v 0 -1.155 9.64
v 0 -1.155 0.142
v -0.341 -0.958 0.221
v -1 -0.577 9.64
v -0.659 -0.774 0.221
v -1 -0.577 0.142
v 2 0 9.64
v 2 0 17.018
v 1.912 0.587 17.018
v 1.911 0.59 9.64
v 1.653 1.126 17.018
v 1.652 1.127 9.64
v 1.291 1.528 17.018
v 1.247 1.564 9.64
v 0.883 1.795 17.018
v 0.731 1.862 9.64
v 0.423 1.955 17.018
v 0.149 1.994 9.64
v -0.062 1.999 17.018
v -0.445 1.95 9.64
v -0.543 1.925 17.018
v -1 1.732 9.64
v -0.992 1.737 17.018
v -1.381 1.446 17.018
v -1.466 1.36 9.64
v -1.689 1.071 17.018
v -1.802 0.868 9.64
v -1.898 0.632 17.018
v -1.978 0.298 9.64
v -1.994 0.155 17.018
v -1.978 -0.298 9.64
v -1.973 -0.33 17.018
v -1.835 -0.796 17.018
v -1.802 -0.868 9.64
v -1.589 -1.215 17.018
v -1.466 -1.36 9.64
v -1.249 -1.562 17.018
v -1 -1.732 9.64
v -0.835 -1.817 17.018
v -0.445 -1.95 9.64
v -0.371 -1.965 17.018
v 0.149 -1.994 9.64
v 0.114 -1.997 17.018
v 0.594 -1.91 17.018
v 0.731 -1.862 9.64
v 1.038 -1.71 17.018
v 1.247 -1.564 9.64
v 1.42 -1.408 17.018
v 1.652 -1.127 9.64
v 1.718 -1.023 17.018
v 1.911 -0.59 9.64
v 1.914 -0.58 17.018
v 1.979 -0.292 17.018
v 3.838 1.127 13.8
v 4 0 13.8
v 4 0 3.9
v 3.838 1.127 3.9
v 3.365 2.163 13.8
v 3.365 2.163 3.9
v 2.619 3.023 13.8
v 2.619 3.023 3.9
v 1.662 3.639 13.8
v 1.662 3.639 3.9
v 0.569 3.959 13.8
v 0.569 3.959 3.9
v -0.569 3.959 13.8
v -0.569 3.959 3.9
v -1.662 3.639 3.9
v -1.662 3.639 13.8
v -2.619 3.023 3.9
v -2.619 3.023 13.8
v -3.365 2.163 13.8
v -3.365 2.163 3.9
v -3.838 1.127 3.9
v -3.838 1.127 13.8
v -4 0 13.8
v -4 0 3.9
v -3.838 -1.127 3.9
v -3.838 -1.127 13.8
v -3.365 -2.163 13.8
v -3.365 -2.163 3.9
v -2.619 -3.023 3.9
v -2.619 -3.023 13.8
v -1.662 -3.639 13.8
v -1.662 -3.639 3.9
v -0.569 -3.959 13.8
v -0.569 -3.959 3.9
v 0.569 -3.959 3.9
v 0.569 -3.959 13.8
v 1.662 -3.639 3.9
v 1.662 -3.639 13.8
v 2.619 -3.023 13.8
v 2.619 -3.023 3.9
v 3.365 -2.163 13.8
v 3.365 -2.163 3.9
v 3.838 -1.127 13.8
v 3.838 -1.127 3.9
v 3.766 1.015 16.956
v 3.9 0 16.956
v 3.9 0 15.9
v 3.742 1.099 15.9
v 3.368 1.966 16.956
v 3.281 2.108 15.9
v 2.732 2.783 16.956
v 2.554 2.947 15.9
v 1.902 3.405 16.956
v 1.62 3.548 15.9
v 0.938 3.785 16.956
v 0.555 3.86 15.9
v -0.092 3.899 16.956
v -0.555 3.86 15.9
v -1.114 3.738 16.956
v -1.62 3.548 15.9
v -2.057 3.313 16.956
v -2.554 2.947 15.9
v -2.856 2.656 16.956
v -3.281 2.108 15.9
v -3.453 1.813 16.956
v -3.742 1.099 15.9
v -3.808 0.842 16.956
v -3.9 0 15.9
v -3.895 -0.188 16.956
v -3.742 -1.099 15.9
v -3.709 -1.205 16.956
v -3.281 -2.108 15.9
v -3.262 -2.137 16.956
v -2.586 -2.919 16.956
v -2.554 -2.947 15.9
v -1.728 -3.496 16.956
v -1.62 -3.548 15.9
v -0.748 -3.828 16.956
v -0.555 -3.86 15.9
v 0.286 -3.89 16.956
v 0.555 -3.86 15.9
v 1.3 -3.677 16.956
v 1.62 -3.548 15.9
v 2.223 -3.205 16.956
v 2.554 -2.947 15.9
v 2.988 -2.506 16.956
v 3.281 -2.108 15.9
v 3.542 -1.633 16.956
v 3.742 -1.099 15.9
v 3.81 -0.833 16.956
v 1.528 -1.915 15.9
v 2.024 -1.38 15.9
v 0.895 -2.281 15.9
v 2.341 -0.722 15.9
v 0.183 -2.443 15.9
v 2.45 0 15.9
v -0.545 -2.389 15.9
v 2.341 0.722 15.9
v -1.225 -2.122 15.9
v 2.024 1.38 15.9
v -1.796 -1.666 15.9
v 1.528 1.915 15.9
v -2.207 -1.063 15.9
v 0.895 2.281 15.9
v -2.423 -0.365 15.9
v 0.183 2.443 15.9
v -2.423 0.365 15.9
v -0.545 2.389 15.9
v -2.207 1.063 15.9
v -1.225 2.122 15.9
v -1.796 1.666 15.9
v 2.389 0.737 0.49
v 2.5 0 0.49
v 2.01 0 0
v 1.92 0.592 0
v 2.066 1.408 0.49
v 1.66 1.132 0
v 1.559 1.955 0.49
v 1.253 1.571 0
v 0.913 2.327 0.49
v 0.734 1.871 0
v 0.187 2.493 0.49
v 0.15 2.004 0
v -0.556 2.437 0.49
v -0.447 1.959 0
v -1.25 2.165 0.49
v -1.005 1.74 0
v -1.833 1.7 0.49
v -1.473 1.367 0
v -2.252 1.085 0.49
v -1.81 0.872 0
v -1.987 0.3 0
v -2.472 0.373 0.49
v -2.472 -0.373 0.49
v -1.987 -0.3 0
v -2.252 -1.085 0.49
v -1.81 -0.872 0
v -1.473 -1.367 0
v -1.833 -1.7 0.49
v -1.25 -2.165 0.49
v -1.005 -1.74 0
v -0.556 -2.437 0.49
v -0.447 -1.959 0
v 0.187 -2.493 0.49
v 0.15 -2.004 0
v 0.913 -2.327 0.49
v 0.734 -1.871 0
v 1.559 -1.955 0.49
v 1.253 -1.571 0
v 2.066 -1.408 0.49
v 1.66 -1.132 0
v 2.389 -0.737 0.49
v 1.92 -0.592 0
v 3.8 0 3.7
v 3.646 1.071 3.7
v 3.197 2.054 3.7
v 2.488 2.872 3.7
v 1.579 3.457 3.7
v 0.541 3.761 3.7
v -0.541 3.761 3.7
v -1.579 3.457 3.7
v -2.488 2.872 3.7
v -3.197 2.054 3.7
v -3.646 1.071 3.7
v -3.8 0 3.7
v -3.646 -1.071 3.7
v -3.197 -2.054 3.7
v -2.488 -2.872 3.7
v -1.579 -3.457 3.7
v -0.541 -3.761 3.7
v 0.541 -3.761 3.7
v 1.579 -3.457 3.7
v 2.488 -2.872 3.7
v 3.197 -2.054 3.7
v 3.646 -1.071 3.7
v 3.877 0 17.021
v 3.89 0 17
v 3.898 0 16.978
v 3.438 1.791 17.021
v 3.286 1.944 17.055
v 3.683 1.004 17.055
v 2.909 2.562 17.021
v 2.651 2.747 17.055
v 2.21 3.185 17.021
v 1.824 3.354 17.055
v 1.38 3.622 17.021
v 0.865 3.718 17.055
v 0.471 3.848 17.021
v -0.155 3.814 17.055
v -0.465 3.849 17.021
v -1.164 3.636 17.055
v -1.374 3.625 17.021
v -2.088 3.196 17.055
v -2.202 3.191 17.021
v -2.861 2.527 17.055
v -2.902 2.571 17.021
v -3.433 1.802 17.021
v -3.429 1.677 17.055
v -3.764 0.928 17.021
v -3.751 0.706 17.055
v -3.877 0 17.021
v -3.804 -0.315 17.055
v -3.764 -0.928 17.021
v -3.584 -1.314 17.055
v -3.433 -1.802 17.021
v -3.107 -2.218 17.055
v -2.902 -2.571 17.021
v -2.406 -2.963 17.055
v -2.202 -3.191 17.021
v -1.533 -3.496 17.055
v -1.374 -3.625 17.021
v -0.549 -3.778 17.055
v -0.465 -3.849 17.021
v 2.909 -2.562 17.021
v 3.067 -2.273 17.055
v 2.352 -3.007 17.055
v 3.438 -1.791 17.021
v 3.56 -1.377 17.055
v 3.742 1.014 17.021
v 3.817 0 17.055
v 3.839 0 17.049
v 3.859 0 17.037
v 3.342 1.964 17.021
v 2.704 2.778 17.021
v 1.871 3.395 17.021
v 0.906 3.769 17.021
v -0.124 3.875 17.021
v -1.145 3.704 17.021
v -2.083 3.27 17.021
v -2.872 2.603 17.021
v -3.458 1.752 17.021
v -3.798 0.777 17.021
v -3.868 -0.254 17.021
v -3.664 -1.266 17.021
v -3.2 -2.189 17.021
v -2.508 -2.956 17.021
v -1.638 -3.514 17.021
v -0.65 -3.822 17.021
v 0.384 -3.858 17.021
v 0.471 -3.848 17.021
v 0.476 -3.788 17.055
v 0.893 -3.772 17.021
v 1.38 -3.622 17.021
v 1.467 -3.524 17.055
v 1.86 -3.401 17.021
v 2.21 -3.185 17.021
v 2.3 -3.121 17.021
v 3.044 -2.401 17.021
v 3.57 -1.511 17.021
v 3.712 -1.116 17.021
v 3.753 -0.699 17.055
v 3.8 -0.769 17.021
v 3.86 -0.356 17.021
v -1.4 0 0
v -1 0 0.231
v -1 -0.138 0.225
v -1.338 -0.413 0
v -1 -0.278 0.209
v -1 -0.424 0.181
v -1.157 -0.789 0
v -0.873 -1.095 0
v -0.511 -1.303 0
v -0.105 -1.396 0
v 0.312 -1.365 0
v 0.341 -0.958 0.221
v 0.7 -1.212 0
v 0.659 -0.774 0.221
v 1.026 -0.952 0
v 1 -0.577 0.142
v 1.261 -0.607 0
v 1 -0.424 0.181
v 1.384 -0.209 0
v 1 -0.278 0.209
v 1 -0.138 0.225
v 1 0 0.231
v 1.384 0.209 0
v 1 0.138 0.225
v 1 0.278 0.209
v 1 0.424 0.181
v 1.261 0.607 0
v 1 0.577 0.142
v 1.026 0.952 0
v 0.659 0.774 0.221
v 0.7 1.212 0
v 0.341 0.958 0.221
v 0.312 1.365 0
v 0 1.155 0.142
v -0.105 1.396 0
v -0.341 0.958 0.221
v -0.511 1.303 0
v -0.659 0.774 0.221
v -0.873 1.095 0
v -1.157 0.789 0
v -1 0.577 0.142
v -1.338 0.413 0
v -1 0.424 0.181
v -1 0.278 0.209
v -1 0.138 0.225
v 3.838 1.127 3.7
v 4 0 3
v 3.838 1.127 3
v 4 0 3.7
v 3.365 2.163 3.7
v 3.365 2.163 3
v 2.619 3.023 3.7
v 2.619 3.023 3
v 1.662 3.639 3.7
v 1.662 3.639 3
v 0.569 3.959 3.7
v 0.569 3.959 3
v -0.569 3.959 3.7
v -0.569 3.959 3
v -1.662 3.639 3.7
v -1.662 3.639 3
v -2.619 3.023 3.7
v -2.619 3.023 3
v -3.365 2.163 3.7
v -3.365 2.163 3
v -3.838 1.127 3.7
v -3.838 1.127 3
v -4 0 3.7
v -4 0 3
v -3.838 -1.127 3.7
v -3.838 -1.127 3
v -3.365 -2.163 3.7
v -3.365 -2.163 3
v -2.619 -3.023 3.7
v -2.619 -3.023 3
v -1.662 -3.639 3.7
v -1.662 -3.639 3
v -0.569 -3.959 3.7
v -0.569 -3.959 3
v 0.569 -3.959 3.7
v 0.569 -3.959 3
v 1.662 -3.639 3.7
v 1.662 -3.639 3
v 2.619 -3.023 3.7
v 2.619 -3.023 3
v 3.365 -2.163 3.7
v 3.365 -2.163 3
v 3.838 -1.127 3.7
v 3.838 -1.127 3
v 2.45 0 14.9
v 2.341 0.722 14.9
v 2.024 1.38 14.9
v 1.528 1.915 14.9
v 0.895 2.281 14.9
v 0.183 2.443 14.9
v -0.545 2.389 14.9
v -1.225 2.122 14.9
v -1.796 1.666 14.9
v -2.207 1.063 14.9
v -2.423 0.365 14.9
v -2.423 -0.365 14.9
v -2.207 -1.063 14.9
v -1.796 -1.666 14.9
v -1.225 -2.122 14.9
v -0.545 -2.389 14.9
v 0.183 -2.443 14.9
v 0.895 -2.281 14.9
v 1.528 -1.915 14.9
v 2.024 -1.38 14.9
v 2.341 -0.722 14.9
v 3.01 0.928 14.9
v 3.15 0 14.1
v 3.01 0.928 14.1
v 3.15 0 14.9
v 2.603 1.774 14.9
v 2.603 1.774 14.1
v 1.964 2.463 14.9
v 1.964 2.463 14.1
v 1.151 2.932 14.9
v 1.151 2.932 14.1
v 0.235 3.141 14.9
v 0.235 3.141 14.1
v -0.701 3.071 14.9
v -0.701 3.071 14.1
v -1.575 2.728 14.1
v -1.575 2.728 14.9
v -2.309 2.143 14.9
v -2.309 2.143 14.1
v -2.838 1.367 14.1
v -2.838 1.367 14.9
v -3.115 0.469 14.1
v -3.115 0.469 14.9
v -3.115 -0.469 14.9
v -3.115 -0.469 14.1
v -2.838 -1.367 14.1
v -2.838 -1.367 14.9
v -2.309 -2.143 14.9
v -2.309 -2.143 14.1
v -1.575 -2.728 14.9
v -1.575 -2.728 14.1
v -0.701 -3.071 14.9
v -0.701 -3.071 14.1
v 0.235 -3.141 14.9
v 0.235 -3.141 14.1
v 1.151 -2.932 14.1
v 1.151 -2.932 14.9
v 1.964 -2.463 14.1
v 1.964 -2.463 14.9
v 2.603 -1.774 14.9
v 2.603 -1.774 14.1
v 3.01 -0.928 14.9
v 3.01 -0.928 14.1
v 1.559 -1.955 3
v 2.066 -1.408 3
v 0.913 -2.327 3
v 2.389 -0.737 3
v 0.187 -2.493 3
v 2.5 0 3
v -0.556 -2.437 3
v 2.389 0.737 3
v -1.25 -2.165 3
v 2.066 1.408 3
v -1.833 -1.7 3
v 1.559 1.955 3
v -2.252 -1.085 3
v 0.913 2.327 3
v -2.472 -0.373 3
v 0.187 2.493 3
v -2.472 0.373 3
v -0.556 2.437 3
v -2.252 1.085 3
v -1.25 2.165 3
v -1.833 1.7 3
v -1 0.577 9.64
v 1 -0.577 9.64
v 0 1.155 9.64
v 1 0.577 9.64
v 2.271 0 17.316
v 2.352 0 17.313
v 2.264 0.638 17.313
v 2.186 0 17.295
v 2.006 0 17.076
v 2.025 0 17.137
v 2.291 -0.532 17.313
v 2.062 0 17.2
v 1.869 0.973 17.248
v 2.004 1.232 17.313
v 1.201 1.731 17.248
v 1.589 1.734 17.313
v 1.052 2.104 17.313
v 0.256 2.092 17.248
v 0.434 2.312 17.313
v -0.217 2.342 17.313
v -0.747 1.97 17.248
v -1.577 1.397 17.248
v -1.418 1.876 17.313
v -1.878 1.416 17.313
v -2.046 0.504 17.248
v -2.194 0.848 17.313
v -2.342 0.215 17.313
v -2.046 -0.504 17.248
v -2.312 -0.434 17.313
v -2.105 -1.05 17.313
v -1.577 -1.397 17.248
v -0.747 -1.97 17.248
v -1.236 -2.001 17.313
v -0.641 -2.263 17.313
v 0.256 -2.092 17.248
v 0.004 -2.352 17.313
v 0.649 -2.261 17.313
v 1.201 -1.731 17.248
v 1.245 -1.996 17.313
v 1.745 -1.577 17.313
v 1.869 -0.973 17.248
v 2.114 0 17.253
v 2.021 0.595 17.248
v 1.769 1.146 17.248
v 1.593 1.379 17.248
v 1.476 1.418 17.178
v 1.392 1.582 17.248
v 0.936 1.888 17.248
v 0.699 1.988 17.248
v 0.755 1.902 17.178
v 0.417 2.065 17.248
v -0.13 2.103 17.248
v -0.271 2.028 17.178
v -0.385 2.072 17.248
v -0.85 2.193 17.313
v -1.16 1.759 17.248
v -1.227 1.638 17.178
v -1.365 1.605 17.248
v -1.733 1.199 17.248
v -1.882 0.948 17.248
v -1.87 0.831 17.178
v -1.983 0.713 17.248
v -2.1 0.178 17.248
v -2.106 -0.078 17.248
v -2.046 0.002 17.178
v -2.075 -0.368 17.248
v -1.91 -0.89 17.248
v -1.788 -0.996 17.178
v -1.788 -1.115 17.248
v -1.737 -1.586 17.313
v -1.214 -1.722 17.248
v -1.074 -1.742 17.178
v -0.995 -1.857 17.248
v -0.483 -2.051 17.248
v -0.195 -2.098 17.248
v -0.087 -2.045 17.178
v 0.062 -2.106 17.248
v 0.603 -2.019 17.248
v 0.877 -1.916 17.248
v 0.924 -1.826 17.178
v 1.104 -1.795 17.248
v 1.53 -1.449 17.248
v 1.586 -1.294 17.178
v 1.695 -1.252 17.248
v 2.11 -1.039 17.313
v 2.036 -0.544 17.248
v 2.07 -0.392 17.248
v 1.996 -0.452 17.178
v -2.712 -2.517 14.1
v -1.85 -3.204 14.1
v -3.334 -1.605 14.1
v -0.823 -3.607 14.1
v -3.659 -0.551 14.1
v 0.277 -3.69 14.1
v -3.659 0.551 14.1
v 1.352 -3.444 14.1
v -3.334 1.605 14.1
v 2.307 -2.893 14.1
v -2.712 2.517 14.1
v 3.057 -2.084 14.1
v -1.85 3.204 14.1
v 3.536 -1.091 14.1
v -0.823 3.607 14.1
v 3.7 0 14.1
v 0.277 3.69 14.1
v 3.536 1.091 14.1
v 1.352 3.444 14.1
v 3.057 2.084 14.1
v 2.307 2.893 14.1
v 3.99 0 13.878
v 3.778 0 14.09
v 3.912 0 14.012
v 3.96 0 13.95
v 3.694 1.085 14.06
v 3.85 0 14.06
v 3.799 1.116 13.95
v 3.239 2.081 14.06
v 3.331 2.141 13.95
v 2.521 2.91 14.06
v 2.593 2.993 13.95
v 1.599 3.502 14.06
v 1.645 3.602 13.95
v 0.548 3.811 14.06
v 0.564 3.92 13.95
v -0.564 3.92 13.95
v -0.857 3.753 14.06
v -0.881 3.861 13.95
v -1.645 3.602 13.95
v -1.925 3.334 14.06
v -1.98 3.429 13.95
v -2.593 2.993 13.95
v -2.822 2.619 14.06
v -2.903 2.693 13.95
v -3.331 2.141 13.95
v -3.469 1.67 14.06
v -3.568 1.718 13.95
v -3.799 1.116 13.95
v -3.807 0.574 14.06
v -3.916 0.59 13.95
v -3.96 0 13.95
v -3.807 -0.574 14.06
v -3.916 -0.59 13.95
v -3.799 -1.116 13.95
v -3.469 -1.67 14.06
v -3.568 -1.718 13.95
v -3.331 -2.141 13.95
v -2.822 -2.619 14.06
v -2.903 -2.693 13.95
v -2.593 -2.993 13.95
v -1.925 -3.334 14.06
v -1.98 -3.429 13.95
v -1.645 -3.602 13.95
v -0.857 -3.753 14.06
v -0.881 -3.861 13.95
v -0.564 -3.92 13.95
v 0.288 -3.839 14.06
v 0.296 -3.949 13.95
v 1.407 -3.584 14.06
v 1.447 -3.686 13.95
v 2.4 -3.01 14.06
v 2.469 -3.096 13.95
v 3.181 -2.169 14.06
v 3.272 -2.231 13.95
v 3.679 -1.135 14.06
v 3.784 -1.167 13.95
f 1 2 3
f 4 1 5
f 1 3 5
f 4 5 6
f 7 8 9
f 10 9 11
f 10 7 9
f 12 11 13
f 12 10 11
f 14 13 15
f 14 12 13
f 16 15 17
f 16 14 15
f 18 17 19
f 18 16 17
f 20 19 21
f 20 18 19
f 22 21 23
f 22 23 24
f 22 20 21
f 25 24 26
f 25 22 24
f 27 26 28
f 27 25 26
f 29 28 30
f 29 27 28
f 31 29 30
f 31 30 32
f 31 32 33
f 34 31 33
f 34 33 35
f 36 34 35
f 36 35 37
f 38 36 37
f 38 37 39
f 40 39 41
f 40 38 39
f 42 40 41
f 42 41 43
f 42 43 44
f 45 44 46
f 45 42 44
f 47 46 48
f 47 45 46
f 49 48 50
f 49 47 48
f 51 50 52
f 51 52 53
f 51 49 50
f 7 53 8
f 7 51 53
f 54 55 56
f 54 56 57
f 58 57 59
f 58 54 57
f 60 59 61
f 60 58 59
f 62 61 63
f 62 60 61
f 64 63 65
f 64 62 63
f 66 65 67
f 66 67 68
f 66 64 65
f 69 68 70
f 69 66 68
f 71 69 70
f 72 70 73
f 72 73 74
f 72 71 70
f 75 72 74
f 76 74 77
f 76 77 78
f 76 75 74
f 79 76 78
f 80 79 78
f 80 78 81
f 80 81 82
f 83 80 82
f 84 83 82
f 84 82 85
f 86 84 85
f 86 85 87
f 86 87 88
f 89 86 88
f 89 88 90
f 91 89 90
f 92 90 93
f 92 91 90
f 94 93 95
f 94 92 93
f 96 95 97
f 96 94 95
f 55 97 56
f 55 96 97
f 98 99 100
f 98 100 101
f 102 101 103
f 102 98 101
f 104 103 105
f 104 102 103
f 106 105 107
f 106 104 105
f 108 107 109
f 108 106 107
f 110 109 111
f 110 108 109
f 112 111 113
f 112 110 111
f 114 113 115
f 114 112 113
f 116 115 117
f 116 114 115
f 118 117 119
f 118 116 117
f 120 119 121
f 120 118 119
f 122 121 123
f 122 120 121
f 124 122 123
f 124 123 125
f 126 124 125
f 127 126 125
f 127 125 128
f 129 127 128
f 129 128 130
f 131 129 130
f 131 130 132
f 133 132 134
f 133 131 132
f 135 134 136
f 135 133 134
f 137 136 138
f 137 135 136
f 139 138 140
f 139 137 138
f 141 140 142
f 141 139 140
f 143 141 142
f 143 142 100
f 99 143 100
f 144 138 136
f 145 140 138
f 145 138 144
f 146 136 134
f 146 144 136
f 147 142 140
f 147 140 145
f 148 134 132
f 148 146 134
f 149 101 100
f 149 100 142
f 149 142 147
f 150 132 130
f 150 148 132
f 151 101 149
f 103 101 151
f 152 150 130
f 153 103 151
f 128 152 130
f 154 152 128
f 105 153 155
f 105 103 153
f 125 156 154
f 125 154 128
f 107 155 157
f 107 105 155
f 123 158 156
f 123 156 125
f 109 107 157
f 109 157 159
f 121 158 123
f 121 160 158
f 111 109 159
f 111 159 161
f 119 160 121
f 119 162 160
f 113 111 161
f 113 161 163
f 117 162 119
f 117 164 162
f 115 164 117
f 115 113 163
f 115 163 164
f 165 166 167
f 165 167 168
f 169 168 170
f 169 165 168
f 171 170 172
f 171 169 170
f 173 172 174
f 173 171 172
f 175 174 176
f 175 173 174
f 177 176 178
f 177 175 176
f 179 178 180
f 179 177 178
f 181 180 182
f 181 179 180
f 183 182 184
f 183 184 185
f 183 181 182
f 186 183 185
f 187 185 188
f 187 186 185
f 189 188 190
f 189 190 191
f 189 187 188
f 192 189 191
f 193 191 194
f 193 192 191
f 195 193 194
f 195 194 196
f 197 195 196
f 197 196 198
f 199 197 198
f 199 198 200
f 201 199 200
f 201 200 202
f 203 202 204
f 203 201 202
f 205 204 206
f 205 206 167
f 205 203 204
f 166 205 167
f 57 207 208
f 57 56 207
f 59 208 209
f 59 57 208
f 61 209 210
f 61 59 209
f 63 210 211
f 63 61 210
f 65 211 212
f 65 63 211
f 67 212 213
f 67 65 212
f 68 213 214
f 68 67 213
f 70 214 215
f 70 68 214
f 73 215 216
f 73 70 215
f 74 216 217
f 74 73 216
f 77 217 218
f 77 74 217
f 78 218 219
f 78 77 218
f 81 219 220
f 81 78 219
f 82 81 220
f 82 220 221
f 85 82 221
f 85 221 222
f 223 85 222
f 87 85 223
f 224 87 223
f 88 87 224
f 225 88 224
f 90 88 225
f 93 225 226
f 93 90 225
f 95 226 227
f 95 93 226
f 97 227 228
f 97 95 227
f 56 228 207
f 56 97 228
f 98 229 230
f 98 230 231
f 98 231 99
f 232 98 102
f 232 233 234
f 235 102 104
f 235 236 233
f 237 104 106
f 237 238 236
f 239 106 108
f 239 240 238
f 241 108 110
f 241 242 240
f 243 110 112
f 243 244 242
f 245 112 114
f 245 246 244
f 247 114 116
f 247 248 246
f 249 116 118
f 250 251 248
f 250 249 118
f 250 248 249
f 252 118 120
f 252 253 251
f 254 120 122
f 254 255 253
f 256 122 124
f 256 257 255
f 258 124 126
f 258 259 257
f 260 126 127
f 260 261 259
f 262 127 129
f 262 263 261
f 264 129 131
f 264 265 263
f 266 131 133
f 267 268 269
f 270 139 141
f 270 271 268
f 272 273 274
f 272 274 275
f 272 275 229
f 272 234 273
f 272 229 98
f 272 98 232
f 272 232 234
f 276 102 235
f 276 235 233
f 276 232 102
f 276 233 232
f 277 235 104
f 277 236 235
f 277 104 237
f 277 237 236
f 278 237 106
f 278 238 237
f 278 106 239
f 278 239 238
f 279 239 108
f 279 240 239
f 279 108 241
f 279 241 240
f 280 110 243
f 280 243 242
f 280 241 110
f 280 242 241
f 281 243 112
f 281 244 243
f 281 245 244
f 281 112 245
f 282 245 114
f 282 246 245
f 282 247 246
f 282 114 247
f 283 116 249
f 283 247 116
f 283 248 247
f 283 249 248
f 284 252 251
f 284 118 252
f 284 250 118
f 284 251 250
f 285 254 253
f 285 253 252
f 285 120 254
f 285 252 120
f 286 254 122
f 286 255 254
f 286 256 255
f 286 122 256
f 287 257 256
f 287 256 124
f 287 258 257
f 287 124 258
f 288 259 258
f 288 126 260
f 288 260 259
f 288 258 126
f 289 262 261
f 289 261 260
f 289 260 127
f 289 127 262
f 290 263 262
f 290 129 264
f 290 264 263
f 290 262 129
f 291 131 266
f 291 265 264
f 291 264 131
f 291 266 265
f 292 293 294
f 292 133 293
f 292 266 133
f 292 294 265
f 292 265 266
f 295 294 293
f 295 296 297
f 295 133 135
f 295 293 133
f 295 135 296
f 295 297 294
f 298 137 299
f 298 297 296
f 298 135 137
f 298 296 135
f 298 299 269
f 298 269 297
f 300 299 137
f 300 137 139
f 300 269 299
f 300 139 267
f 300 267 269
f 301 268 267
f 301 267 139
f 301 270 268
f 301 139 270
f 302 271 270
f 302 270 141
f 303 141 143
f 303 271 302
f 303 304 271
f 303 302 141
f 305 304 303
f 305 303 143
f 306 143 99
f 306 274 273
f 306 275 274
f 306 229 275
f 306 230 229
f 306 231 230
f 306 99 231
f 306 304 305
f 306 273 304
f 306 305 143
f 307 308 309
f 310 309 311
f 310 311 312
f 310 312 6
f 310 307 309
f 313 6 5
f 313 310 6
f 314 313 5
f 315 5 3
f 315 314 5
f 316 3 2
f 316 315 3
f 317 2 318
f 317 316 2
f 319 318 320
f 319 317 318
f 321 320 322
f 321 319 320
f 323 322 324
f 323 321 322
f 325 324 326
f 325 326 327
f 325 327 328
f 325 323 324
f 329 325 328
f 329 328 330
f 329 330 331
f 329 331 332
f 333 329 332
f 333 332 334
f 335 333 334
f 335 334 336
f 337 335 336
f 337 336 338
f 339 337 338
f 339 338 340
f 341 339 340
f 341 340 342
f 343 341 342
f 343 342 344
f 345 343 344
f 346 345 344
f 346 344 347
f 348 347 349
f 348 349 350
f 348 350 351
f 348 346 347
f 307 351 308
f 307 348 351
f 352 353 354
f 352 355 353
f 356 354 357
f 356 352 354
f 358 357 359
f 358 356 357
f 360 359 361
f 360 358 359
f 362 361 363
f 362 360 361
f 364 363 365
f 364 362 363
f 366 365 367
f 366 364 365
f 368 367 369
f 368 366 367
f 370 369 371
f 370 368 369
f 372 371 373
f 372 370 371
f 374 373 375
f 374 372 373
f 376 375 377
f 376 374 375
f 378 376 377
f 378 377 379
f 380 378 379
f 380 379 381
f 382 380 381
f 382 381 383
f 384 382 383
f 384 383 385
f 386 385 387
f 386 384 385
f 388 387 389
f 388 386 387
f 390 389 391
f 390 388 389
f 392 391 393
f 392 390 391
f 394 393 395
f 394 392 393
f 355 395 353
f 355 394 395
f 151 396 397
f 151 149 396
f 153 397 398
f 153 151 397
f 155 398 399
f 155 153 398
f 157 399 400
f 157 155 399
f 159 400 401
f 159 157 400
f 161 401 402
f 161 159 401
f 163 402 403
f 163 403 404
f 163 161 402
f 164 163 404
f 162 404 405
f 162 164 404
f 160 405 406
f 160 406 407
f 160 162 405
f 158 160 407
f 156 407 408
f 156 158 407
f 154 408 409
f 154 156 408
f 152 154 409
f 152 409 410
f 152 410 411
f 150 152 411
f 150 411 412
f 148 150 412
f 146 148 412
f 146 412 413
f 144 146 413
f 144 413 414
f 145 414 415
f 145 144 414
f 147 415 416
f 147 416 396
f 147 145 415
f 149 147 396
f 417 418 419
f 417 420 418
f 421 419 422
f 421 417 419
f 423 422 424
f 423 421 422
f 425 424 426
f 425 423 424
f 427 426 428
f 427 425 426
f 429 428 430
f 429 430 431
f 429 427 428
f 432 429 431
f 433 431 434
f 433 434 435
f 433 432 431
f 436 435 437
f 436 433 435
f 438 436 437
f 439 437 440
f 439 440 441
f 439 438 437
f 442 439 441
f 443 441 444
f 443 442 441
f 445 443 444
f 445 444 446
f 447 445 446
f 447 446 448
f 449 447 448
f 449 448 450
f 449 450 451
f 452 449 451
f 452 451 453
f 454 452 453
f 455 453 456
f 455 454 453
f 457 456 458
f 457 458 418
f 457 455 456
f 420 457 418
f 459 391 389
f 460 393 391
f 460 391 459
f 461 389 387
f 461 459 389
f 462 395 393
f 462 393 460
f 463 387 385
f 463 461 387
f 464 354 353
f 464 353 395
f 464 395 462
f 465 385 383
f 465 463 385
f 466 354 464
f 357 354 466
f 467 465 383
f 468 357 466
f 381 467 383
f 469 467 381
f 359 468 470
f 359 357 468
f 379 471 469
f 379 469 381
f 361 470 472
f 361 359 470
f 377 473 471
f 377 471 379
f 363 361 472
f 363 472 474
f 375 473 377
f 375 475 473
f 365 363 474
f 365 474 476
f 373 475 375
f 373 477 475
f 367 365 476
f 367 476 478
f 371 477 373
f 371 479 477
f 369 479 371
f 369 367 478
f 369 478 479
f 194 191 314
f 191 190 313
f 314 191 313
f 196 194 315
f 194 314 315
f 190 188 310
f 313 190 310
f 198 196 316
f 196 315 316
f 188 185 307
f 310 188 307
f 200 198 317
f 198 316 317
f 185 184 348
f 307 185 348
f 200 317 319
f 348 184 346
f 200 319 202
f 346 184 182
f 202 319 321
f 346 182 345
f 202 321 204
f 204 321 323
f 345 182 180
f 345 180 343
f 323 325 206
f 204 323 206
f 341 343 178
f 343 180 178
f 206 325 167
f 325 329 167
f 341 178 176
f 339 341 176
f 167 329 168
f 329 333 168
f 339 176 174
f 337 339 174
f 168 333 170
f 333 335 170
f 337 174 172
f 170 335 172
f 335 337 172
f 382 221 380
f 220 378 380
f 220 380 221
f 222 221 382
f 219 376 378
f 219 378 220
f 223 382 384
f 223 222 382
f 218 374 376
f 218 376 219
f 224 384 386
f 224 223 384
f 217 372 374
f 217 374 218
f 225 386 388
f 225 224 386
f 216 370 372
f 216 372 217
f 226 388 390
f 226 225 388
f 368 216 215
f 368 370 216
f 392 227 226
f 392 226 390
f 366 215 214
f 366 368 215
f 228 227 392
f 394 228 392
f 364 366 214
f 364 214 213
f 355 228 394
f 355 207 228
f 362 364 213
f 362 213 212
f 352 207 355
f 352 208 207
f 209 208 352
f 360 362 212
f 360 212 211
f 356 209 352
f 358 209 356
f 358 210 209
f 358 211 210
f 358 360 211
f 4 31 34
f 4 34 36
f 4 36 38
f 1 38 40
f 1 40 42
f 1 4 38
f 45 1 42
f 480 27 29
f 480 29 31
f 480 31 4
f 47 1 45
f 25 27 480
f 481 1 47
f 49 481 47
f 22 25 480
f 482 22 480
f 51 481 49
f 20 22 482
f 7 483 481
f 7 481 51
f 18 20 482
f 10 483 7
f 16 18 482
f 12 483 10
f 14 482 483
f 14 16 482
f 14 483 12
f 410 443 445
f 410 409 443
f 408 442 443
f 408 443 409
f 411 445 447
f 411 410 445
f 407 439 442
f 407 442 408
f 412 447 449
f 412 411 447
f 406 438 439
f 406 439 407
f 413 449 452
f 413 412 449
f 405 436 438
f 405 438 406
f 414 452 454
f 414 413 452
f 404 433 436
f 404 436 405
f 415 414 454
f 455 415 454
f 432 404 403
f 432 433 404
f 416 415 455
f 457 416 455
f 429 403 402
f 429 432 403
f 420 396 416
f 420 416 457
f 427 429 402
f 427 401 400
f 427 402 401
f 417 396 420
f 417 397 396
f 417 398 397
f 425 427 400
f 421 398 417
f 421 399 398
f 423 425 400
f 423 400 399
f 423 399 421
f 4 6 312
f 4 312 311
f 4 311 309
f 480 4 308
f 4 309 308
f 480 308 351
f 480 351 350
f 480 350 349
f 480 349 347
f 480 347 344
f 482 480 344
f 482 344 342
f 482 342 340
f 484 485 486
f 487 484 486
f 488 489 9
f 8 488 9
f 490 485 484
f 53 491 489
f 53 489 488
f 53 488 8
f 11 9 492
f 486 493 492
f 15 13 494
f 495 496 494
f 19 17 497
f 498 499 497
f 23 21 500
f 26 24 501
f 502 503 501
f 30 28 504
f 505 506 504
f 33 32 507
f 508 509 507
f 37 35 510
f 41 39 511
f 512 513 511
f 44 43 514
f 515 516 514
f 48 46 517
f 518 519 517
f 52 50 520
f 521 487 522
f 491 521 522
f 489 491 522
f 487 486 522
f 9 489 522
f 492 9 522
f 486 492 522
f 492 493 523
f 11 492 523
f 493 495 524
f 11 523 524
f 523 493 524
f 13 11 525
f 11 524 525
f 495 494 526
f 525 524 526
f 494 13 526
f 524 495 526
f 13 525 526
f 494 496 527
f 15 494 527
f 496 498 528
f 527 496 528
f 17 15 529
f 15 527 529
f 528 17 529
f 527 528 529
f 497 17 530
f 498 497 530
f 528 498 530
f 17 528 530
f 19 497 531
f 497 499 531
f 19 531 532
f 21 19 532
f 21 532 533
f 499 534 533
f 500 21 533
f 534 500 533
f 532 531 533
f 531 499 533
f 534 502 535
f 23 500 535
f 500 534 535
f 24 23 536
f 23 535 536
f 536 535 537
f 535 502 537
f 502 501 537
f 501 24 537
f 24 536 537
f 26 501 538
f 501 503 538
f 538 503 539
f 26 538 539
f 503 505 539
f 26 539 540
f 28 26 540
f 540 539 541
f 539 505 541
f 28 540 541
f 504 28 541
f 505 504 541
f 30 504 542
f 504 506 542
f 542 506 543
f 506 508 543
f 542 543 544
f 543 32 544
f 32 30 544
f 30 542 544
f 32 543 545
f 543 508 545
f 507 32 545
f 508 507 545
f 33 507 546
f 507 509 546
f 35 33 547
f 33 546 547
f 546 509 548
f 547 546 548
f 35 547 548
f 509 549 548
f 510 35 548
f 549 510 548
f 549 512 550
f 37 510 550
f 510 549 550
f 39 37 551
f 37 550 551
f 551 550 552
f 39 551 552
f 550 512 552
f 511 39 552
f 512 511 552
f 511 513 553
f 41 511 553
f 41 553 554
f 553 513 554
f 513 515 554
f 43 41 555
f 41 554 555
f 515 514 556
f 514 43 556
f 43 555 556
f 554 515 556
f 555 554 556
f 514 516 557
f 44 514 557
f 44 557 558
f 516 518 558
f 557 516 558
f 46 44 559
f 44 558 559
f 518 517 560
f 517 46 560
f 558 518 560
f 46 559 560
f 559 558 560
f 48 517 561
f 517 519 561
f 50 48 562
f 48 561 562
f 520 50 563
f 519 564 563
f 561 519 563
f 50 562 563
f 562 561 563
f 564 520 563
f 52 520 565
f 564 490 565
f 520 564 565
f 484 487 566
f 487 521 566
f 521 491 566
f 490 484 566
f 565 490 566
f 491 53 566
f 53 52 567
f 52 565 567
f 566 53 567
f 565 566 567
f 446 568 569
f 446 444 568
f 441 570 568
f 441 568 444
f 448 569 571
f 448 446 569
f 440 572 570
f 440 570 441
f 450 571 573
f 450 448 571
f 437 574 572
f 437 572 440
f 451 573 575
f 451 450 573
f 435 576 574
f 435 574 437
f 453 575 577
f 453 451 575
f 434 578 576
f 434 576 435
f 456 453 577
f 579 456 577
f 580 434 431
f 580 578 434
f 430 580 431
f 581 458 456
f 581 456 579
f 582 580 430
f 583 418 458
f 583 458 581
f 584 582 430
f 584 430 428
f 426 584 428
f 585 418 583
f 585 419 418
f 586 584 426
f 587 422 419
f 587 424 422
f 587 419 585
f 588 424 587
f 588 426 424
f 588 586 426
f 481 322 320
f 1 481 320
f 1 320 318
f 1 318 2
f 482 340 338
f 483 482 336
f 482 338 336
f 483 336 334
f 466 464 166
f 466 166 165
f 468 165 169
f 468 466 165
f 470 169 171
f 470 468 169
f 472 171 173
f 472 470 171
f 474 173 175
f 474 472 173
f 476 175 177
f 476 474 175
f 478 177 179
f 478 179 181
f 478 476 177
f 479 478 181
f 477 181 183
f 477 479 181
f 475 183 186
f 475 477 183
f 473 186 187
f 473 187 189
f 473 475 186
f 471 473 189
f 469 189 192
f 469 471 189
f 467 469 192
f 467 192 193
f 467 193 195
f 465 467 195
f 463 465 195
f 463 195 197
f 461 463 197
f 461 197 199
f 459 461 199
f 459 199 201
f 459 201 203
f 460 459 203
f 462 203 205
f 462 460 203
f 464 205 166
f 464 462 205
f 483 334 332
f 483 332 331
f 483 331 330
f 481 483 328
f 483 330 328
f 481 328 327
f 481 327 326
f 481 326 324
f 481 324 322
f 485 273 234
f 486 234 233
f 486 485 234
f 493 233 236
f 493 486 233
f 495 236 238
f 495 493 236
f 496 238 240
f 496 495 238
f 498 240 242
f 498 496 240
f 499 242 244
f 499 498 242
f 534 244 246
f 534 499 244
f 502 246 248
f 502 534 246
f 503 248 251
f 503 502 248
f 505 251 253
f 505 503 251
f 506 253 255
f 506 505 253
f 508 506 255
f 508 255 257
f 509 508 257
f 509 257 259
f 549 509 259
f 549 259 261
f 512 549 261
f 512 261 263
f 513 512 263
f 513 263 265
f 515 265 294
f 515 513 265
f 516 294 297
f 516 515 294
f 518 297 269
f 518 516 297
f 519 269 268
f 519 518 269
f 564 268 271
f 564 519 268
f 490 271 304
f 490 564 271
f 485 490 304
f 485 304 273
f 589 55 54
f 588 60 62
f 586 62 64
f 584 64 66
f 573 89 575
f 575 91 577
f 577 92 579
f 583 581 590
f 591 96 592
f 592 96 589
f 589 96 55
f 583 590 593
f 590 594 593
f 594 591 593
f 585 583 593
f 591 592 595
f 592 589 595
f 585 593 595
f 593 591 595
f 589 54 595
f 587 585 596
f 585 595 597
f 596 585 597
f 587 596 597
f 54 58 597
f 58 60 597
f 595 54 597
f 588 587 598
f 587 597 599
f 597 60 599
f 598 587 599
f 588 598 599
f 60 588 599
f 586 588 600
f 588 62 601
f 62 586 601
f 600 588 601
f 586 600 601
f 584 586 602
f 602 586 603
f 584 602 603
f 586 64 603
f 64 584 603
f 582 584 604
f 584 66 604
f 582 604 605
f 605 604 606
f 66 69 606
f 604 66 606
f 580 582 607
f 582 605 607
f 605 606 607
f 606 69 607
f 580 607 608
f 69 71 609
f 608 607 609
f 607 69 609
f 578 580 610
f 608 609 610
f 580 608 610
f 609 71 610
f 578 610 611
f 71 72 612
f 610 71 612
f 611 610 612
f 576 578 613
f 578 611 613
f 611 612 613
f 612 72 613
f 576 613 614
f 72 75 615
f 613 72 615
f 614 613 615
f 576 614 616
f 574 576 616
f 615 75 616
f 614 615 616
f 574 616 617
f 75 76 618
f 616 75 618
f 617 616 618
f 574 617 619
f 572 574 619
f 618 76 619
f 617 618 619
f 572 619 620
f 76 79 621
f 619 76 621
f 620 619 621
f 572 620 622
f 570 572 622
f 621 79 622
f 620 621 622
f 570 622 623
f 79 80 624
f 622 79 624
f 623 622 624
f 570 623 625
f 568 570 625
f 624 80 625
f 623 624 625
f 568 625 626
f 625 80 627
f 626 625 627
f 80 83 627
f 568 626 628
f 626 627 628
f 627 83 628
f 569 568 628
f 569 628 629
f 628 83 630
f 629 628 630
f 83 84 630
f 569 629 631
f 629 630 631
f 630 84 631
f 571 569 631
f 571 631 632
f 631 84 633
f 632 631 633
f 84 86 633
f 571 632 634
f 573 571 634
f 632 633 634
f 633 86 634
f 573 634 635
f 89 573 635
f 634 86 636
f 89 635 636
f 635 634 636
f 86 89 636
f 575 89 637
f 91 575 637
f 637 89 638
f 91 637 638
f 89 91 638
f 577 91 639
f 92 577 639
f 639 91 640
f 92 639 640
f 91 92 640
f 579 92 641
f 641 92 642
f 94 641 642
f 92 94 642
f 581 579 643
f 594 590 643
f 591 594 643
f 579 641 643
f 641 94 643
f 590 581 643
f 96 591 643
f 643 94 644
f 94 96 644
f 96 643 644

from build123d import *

# Parameters (mm, degrees)
CUT_EXTRUDE1_2_OUTLINE_R = 2
CUT_EXTRUDE1_2_DEPTH     = 9.64
CUT_EXTRUDE1_3_DEPTH     = 0.141623609
CHAMFER1_SIZE            = 0.4905
FILLET1_R                = 0.1
FILLET2_R                = 0.3


with BuildPart() as part:
    # Cut-Extrude1: read off the stored shape, not the designer's step
    # Cut-Extrude1 outline → Cut-Extrude1 (revolve)
    with BuildSketch(Plane.XZ):
        Polygon((3.8, 3.7), (4, 3.9), (4, 14.1), (3.15, 14.1), (3.15, 14.9), (2.45, 14.9), (2.45, 15.9), (3.9, 15.9), (3.9, 17.040270357), (2, 17.375291621), (2, 0), (2.5, 0), (2.5, 3), (4, 3), (4, 3.7), align=None)
    revolve(axis=Axis((0, 0, 0), (0, 0, 1)))

    # Cut-Extrude1 2 outline → Cut-Extrude1 2 (add)
    with BuildSketch(Plane.XY):
        Circle(CUT_EXTRUDE1_2_OUTLINE_R)
        Polygon((1, -0.577350269), (0, -1.154700538), (-1, -0.577350269), (-1, 0.577350269), (0, 1.154700538), (1, 0.577350269), align=None, mode=Mode.SUBTRACT)
    extrude(amount=CUT_EXTRUDE1_2_DEPTH)

    # Cut-Extrude1 3 outline → Cut-Extrude1 3 (add)
    with BuildSketch(Plane.XY):
        Polygon((-1, -0.577350269), (0, -1.154700538), (1, -0.577350269), (1, 0.57735027), (0, 1.154700538), (-1, 0.577350269), align=None)
    extrude(amount=CUT_EXTRUDE1_3_DEPTH)

    # Cut-Extrude1 4 outline → Cut-Extrude1 4 (revolve)
    with BuildSketch(Plane.XZ):
        Polygon((0.999972461, 0.230956007), (0, 0.230956007), (0, 0.141623609), (1.154700539, 0.141623609), align=None)
    revolve(axis=Axis((0, 0, 0), (0, 0, 1)))

    # Sketch2 → Cut-Revolve1 (revolve, cut)
    with BuildSketch(Plane(origin=(0, 0, 0), x_dir=(1, 0, 0), z_dir=(0, 1, 0)), mode=Mode.PRIVATE) as cut_revolve1_sk:
        Polygon((1.4, 0), (0, 0), (0, -0.230956007), (0.999972461, -0.230956007), align=None)
    revolve(cut_revolve1_sk.sketch.rotate(Axis((0, 0, 0), (0, 0, 1)), 180), axis=Axis((0, 0, 0), (0, 0, 1)), mode=Mode.SUBTRACT)

    # Chamfer1
    chamfer1_edges = [part.edges().sort_by_distance(p)[0] for p in [
        (-2.5, 0, 0),
    ]]
    chamfer(chamfer1_edges, length=CHAMFER1_SIZE)

    # Fillet1
    fillet1_edges = [part.edges().sort_by_distance(p)[0] for p in [
        (-3.9, 0, 17.040270357),
    ]]
    fillet(fillet1_edges, radius=FILLET1_R)

    # Fillet2
    fillet2_edges = [part.edges().sort_by_distance(p)[0] for p in [
        (-2, 0, 17.375291621),
        (-4, 0, 14.1),
    ]]
    fillet(fillet2_edges, radius=FILLET2_R)


solid = part.part
